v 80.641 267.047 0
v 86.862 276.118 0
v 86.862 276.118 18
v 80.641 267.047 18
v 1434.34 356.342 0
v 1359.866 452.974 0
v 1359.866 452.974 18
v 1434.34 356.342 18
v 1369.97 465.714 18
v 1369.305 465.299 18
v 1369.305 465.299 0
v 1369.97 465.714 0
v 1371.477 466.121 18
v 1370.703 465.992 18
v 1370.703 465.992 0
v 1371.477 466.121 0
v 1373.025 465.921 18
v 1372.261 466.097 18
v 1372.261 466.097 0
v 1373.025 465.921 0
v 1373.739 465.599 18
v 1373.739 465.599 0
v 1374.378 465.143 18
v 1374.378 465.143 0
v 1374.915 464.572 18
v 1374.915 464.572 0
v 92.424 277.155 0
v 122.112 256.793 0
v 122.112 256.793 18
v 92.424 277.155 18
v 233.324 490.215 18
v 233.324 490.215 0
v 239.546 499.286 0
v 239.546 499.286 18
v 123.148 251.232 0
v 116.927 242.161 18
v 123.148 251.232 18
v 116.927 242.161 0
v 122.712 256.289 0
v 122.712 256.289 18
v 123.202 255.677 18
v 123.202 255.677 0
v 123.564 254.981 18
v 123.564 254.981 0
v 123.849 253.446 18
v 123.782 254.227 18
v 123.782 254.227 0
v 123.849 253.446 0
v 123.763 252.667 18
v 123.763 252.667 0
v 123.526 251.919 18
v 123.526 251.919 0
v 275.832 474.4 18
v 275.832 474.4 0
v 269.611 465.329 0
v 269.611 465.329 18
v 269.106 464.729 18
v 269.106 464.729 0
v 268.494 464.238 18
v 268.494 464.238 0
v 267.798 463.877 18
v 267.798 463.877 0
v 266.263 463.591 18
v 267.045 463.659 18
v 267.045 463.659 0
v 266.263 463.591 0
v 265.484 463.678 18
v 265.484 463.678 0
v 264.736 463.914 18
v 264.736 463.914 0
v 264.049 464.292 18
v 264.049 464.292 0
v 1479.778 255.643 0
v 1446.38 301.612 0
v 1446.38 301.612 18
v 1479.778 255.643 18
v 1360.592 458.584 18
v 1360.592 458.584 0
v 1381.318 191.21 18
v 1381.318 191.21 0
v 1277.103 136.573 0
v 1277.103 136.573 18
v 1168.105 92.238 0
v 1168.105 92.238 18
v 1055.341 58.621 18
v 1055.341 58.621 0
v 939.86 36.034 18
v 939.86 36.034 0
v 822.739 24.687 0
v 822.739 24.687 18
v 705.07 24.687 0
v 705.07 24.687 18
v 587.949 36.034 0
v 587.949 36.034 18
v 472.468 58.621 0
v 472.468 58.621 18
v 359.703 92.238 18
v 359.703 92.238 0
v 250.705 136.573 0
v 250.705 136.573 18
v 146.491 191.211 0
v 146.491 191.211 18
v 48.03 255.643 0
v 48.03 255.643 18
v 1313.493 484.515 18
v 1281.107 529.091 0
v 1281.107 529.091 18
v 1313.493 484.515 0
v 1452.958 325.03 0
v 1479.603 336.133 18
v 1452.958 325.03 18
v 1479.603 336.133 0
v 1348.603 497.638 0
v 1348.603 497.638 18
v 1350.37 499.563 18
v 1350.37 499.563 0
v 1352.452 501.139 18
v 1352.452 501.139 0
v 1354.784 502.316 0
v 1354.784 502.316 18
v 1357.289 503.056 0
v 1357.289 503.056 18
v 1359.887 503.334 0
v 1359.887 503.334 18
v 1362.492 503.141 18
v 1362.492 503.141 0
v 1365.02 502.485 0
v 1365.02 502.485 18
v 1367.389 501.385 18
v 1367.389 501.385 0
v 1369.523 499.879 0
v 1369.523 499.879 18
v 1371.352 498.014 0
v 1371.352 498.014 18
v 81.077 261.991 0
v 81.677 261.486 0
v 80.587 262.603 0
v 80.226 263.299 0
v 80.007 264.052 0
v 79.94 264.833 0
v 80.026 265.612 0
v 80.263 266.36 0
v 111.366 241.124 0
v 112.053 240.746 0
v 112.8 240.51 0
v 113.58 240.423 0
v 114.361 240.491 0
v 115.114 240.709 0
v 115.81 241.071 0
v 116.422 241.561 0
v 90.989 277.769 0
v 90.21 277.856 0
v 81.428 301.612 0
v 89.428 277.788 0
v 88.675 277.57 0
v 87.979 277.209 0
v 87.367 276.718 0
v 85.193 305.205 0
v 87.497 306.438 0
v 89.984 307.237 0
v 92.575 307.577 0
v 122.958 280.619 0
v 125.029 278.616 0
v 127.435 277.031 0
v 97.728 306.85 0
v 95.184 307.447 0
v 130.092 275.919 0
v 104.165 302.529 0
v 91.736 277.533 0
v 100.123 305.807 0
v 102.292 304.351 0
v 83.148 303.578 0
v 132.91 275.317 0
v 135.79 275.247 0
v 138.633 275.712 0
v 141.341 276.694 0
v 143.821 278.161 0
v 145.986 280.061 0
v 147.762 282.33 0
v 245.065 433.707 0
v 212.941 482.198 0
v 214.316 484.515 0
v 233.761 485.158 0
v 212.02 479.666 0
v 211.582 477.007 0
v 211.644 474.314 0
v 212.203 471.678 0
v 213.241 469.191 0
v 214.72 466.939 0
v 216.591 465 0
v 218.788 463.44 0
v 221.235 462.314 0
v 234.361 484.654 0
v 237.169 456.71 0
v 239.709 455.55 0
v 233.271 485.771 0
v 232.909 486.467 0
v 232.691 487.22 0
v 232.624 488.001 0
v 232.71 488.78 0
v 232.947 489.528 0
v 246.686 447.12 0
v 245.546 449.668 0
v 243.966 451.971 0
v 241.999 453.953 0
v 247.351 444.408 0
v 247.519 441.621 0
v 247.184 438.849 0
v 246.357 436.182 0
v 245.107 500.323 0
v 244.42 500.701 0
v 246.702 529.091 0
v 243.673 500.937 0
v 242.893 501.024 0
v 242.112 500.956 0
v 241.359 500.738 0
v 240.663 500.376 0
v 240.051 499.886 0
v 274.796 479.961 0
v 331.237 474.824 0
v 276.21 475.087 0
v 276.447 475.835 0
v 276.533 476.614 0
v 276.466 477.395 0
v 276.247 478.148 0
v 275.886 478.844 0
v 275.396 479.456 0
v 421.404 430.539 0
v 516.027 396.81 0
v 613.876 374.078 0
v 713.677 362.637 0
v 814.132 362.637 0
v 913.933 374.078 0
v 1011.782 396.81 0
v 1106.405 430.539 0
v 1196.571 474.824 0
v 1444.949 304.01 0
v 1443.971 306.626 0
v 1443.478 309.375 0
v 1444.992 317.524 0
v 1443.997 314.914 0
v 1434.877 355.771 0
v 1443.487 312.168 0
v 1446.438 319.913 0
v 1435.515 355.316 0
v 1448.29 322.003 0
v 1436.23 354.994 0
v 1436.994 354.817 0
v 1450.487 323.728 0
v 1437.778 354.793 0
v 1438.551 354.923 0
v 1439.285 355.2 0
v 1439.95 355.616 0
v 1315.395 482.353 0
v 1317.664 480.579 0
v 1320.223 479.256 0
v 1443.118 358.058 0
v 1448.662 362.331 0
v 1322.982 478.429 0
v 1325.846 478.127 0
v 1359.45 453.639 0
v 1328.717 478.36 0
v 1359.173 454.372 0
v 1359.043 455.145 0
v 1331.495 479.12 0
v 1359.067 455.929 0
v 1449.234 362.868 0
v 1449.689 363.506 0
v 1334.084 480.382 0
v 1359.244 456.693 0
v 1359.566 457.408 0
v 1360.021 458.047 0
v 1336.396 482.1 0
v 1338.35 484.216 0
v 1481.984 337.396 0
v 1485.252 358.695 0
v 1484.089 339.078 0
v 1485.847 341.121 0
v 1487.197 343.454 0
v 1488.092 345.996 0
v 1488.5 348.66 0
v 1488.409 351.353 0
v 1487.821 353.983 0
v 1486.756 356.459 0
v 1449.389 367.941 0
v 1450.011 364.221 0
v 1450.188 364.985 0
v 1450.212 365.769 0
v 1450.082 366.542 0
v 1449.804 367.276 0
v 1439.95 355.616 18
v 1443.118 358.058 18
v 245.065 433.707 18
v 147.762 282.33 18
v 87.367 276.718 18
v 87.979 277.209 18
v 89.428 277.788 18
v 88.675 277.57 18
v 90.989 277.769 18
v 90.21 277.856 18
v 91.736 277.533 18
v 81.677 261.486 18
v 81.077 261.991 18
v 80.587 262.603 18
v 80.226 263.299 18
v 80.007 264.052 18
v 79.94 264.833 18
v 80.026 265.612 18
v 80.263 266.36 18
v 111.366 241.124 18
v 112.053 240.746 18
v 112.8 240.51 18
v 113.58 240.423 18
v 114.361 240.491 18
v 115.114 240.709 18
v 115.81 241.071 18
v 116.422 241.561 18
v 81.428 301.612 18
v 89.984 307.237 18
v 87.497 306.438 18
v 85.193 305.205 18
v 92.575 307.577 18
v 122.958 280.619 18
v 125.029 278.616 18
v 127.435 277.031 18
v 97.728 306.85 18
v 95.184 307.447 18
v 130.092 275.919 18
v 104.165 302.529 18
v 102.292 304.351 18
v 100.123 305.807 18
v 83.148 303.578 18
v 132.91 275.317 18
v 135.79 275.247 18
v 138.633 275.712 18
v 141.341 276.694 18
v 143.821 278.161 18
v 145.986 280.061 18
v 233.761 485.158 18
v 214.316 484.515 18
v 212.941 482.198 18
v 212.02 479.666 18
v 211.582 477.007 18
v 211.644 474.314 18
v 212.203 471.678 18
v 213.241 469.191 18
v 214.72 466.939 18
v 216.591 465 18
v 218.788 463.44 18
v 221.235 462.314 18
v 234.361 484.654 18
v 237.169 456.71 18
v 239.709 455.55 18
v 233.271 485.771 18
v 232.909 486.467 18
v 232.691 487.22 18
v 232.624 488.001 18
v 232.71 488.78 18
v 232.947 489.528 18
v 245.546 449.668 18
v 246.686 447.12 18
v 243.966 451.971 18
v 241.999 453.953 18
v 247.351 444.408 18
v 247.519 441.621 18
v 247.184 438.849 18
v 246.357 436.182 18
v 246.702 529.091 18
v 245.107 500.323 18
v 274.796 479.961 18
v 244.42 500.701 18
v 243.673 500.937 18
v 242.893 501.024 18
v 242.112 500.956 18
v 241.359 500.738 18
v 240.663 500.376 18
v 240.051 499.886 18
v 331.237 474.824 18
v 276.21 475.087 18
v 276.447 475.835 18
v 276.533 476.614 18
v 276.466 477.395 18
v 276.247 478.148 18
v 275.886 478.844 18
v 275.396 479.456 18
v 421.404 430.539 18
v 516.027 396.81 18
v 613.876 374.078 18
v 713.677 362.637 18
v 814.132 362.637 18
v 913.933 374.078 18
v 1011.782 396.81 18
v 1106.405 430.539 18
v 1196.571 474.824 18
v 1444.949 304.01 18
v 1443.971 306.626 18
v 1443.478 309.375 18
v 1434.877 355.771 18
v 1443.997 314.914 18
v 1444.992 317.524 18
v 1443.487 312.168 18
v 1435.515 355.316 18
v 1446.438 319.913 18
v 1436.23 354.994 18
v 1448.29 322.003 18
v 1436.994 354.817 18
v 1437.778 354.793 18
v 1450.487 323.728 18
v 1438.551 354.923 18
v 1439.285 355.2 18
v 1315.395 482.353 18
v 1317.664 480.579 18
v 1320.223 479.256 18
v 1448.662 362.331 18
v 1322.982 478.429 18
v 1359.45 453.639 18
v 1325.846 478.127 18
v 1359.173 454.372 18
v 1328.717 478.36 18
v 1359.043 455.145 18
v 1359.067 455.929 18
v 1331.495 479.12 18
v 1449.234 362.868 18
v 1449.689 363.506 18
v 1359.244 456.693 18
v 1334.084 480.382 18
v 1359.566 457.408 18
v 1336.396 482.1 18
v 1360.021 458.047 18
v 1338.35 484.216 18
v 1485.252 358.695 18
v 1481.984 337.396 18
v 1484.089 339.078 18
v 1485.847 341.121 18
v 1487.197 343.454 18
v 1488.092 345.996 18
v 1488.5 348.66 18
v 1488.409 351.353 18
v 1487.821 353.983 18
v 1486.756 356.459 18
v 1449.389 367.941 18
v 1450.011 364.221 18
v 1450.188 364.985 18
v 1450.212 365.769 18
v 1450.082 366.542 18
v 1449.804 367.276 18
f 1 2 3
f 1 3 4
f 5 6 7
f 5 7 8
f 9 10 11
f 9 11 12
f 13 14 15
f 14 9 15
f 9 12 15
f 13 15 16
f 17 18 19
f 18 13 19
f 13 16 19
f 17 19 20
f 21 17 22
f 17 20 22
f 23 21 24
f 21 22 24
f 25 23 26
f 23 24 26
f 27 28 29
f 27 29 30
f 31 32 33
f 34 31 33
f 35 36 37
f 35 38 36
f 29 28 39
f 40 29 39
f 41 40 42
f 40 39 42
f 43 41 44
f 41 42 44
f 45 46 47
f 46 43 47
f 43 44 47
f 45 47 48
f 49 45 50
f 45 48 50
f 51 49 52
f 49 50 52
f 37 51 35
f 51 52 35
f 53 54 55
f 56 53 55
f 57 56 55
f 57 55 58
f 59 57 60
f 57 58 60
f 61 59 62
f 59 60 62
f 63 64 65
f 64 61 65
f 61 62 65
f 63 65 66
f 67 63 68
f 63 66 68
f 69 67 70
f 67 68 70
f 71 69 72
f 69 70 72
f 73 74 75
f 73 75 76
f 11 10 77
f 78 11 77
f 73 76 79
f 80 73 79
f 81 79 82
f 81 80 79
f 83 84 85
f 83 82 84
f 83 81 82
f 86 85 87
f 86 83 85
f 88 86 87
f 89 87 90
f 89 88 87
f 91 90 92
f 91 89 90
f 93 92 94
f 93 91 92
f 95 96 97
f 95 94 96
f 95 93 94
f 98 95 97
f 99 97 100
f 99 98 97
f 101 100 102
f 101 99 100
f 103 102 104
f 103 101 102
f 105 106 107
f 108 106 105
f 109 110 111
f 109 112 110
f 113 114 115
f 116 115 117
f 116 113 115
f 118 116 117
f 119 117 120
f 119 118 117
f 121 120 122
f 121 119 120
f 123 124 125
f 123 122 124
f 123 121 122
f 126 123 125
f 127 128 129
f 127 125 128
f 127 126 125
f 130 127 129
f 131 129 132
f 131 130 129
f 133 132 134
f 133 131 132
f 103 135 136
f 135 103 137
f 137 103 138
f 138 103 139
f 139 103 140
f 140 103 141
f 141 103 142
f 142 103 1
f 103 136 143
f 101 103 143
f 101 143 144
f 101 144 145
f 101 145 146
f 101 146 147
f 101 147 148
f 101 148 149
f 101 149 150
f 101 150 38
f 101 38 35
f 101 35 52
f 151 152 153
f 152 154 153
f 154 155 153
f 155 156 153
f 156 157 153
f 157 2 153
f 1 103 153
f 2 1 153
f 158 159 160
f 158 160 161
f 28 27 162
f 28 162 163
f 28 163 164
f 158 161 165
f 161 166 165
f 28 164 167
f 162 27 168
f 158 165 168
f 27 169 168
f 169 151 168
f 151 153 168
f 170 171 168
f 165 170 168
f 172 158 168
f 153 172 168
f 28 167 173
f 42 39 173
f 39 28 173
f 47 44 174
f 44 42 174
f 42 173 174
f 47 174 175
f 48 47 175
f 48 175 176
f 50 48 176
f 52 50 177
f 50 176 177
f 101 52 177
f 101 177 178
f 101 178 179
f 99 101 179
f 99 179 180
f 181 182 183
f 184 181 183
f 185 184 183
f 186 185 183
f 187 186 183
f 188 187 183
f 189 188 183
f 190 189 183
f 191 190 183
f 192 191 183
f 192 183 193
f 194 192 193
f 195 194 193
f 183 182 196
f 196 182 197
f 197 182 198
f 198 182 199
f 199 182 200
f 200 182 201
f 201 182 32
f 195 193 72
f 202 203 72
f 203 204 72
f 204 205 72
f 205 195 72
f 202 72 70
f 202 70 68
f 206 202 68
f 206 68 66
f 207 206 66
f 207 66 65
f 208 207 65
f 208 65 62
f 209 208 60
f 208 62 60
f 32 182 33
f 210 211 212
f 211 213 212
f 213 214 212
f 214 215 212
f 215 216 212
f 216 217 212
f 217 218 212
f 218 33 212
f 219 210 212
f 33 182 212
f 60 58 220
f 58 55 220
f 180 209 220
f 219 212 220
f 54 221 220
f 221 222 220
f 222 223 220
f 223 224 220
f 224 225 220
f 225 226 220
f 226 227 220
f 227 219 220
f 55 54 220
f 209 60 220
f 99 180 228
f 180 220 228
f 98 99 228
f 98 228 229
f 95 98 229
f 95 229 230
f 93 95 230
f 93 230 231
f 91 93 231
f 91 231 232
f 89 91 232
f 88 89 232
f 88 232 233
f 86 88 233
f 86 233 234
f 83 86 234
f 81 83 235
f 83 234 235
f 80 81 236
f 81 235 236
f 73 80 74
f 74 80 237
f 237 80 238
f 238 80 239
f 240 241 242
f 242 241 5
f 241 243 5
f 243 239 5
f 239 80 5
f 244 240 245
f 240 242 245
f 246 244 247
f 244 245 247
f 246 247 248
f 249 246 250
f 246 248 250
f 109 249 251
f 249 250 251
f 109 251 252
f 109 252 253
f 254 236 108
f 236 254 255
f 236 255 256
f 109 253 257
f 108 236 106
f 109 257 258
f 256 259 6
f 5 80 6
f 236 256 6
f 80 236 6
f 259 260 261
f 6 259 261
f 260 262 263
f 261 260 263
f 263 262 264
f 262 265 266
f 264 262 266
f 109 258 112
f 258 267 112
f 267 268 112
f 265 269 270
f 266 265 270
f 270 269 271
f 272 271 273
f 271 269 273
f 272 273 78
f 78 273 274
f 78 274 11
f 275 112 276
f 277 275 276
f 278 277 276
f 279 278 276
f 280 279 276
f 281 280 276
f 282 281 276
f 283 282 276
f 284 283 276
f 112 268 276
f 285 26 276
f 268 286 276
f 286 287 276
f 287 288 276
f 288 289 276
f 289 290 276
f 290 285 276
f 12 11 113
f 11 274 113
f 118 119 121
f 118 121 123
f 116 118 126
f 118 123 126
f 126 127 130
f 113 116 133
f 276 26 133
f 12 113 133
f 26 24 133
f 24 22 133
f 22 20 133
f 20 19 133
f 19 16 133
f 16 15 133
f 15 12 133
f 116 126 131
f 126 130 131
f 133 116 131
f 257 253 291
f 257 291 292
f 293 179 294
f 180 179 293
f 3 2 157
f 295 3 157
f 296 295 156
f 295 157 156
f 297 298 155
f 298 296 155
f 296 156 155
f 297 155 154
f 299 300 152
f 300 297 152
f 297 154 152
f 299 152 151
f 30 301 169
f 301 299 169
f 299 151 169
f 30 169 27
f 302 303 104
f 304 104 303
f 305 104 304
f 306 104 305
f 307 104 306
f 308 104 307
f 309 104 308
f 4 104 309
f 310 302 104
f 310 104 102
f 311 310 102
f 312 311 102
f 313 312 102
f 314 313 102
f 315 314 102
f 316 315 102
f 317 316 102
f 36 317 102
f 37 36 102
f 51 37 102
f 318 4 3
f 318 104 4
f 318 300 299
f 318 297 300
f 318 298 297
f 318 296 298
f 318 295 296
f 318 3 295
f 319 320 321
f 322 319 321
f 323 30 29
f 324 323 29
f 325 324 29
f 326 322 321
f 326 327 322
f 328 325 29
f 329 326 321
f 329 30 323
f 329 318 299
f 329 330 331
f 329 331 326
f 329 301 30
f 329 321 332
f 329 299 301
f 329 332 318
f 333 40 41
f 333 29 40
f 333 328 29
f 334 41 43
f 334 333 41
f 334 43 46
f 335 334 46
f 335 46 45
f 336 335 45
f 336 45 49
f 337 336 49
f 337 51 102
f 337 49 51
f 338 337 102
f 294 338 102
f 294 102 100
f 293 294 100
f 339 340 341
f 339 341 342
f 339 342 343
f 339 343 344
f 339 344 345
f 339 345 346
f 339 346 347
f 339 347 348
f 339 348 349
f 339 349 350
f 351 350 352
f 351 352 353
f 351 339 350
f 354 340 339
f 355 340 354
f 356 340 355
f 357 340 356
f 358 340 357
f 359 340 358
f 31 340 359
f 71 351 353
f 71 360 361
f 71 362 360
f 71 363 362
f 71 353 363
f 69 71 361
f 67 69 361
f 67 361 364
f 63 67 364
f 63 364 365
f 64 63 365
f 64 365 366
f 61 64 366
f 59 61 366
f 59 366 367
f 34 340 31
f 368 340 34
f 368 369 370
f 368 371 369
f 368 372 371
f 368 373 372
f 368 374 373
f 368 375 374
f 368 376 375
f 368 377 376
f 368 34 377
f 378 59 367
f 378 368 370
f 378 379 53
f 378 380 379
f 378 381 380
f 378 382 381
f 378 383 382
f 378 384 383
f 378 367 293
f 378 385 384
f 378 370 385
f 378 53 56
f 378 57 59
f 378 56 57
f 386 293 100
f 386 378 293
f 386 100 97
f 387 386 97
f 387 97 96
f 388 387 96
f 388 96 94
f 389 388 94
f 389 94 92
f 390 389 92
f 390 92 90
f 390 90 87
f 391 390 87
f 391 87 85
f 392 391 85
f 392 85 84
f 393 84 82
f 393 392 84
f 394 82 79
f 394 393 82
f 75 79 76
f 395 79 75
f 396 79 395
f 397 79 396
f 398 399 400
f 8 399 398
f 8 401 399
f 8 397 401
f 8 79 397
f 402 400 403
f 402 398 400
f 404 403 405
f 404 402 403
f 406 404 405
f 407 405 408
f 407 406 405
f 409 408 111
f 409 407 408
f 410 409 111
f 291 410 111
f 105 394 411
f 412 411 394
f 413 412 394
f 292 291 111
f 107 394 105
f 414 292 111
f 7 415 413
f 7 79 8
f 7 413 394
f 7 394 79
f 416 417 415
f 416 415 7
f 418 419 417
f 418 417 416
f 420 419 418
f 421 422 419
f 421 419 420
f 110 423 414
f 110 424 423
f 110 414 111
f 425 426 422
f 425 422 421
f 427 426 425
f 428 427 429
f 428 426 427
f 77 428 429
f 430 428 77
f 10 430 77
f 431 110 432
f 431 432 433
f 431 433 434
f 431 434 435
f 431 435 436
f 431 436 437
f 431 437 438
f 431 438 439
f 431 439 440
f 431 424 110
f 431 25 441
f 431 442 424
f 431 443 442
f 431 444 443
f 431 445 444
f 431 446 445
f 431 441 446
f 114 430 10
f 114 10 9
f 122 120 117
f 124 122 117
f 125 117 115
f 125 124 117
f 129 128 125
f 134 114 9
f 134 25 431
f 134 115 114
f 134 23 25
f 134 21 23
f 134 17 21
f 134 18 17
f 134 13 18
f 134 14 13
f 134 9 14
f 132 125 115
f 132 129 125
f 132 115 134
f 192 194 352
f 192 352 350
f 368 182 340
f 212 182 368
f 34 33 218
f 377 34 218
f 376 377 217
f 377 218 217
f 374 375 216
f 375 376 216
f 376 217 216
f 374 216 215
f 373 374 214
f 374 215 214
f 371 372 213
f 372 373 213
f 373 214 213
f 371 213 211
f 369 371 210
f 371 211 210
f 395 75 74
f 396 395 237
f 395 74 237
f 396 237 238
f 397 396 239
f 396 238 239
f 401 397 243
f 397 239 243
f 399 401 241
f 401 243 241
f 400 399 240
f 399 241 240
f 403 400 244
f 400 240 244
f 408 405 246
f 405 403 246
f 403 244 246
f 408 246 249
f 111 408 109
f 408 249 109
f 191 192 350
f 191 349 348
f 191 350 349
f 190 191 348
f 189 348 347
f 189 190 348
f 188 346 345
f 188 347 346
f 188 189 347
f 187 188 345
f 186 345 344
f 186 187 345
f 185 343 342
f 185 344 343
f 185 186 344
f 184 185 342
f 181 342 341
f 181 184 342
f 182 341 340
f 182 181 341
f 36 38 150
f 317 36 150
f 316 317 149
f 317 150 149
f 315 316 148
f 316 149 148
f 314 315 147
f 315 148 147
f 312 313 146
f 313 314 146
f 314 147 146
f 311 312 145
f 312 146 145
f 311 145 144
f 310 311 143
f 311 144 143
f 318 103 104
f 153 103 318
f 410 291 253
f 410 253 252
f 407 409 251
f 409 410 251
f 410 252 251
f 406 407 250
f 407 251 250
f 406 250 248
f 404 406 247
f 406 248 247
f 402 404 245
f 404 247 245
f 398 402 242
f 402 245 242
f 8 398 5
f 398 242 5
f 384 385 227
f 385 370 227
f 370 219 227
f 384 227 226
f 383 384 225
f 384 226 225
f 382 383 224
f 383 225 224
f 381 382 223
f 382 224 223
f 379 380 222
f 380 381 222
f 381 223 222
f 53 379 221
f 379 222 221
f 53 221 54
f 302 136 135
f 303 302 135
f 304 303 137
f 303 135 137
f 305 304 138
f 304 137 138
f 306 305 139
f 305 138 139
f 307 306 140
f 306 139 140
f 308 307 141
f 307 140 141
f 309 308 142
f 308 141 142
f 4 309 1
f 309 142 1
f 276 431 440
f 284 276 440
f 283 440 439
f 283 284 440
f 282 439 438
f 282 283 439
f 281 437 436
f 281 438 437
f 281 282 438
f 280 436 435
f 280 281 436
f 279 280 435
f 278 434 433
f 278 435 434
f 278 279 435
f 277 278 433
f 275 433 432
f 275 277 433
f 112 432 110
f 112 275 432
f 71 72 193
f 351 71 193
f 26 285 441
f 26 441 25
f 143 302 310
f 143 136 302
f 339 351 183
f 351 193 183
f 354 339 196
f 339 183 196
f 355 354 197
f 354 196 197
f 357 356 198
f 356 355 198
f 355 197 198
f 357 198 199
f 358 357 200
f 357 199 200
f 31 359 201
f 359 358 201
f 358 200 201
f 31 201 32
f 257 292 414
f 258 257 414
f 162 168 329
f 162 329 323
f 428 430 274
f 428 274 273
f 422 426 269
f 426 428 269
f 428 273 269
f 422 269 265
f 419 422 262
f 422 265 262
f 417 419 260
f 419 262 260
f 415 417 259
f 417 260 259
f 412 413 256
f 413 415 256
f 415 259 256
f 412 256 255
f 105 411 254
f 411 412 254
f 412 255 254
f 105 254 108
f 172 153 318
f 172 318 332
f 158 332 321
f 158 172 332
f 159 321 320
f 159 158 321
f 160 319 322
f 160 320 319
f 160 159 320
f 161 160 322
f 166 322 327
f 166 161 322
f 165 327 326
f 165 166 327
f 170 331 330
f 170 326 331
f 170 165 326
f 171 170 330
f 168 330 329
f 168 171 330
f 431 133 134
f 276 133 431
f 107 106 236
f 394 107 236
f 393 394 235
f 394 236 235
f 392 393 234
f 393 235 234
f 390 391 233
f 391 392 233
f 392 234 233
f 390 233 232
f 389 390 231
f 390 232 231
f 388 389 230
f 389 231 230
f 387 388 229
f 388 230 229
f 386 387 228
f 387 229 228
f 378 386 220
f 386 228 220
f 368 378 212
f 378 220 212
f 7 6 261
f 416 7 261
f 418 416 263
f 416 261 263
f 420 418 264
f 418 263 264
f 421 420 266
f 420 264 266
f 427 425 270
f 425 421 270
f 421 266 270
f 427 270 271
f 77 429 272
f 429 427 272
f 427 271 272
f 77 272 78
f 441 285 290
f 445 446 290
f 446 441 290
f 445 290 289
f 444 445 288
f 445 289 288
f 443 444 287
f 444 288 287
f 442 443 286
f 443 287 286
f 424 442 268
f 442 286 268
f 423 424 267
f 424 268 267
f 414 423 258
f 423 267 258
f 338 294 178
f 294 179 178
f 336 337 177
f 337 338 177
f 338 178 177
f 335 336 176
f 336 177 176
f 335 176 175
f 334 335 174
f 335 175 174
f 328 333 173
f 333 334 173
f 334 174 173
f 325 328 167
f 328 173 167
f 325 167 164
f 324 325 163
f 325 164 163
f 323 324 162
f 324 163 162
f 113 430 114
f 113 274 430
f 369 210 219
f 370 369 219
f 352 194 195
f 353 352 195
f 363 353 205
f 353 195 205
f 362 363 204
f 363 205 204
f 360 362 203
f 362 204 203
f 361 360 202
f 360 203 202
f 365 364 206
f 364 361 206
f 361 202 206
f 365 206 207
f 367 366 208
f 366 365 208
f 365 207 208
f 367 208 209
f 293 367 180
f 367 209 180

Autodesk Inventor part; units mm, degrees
ref_plane "YZ Plane" through (0, 0, 0) normal (1, 0, 0) x (0, 1, 0)
ref_plane "XZ Plane" through (0, 0, 0) normal (0, 1, 0) x (-1, 0, 0)
ref_plane "XY Plane" through (0, 0, 0) normal (0, 0, 1) x (1, 0, 0)
sketch "CONTOURS" plane through (0, 0, 0) normal (0, 0, 1) x (1, 0, 0)
  arc A0 (122.9585, 280.6191) -> (147.7621, 282.3295) centre (134.7234, 290.7105) ccw
  line L0 (147.7621, 282.3295) -> (245.0646, 433.7067)
  arc A1 (245.0646, 433.7067) -> (237.169, 456.7096) centre (232.0259, 442.0877) ccw
  line L1 (237.169, 456.7096) -> (221.2353, 462.314)
  arc A2 (214.3157, 484.5154) -> (221.2353, 462.314) centre (226.0465, 475.9926) ccw
  line L2 (214.3157, 484.5154) -> (246.7015, 529.0906)
  arc A3 (246.7015, 529.0906) -> (1281.107, 529.0906) centre (763.9042, 1241.8098) ccw
  line L3 (1281.107, 529.0906) -> (1313.4927, 484.5154)
  arc A4 (1313.4927, 484.5154) -> (1338.3495, 484.2164) centre (1326.0325, 493.6261) ccw
  line L4 (1338.3495, 484.2164) -> (1348.6034, 497.6384)
  arc A5 (1371.3515, 498.0135) -> (1348.6034, 497.6384) centre (1360.1257, 488.8357) ccw
  line L5 (1371.3515, 498.0135) -> (1485.2517, 358.6952)
  arc A6 (1479.6031, 336.133) -> (1485.2517, 358.6952) centre (1474.0258, 349.5174) ccw
  line L6 (1479.6031, 336.133) -> (1452.9579, 325.03)
  arc A7 (1452.9579, 325.03) -> (1446.3801, 301.6117) centre (1458.9198, 310.7224) ccw
  line L7 (1446.3801, 301.6117) -> (1479.7785, 255.6428)
  arc A8 (48.0301, 255.6429) -> (1479.7785, 255.6428) centre (763.9044, 1242.1407) ccw
  line L8 (48.0301, 255.6429) -> (81.4284, 301.6117)
  arc A9 (104.1651, 302.5292) -> (81.4284, 301.6117) centre (93.1592, 293.0889) ccw
  line L9 (104.1651, 302.5292) -> (122.9585, 280.6191)
sketch "HOLES" plane through (0, 0, 0) normal (0, 0, 1) x (1, 0, 0)
  arc A0 (123.1485, 251.2322) -> (122.1121, 256.7934) centre (119.8497, 253.4946) ccw
  line L0 (122.1121, 256.7934) -> (92.4235, 277.1548)
  arc A1 (92.4235, 277.1548) -> (86.8624, 276.1184) centre (90.1611, 273.856) ccw
  line L1 (86.8624, 276.1184) -> (80.6409, 267.0469)
  arc A2 (80.6409, 267.0469) -> (81.6772, 261.4858) centre (83.9396, 264.7845) ccw
  line L2 (116.9269, 242.1607) -> (123.1485, 251.2322)
  arc A3 (111.3658, 241.1244) -> (116.9269, 242.1607) centre (113.6282, 244.4231) ccw
  line L3 (264.0494, 464.2922) -> (234.3609, 484.6537)
  arc A4 (233.3245, 490.2148) -> (234.3609, 484.6537) centre (236.6232, 487.9524) ccw
  line L4 (233.3245, 490.2148) -> (239.546, 499.2863)
  arc A5 (245.1072, 500.3226) -> (239.546, 499.2863) centre (242.8448, 497.0239) ccw
  line L5 (245.1072, 500.3226) -> (274.7957, 479.9612)
  arc A6 (275.8321, 474.4001) -> (274.7957, 479.9612) centre (272.5334, 476.6625) ccw
  line L6 (275.8321, 474.4001) -> (269.6106, 465.3286)
  arc A7 (264.0494, 464.2922) -> (269.6106, 465.3286) centre (266.3118, 467.591) ccw
  line L7 (1443.1181, 358.0576) -> (1448.6625, 362.3307)
  arc A8 (1448.6625, 362.3307) -> (1449.389, 367.9407) centre (1446.2207, 365.4989) ccw
  line L8 (1449.389, 367.9407) -> (1374.9151, 464.5722)
  arc A9 (1374.9151, 464.5722) -> (1369.3051, 465.2986) centre (1371.7469, 462.1304) ccw
  line L9 (1369.3051, 465.2986) -> (1360.5924, 458.5838)
  arc A10 (1360.5924, 458.5838) -> (1359.866, 452.9738) centre (1363.0342, 455.4155) ccw
  line L10 (1359.866, 452.9738) -> (1434.3398, 356.3423)
  arc A11 (1434.3398, 356.3423) -> (1439.9498, 355.6158) centre (1437.5081, 358.7841) ccw
  line L11 (1439.9498, 355.6158) -> (1443.1181, 358.0576)
  line L12 (81.6772, 261.4858) -> (111.3658, 241.1244)
sketch "LETTERS" plane through (0, 0, 0) normal (0, 0, 1) x (1, 0, 0)
  line L0 (274.8207, 322.605) -> (262.022, 329.8103)
  line L1 (262.022, 329.8103) -> (252.3047, 312.5498)
  line L2 (252.3047, 312.5498) -> (265.1034, 305.3445)
extrude "Extrusion1" add sketch "CONTOURS" along normal blind 18
extrude "Extrusion2" cut sketch "HOLES" along normal blind 18
properties part number "Platform E2" material "Wood (Birch)"
